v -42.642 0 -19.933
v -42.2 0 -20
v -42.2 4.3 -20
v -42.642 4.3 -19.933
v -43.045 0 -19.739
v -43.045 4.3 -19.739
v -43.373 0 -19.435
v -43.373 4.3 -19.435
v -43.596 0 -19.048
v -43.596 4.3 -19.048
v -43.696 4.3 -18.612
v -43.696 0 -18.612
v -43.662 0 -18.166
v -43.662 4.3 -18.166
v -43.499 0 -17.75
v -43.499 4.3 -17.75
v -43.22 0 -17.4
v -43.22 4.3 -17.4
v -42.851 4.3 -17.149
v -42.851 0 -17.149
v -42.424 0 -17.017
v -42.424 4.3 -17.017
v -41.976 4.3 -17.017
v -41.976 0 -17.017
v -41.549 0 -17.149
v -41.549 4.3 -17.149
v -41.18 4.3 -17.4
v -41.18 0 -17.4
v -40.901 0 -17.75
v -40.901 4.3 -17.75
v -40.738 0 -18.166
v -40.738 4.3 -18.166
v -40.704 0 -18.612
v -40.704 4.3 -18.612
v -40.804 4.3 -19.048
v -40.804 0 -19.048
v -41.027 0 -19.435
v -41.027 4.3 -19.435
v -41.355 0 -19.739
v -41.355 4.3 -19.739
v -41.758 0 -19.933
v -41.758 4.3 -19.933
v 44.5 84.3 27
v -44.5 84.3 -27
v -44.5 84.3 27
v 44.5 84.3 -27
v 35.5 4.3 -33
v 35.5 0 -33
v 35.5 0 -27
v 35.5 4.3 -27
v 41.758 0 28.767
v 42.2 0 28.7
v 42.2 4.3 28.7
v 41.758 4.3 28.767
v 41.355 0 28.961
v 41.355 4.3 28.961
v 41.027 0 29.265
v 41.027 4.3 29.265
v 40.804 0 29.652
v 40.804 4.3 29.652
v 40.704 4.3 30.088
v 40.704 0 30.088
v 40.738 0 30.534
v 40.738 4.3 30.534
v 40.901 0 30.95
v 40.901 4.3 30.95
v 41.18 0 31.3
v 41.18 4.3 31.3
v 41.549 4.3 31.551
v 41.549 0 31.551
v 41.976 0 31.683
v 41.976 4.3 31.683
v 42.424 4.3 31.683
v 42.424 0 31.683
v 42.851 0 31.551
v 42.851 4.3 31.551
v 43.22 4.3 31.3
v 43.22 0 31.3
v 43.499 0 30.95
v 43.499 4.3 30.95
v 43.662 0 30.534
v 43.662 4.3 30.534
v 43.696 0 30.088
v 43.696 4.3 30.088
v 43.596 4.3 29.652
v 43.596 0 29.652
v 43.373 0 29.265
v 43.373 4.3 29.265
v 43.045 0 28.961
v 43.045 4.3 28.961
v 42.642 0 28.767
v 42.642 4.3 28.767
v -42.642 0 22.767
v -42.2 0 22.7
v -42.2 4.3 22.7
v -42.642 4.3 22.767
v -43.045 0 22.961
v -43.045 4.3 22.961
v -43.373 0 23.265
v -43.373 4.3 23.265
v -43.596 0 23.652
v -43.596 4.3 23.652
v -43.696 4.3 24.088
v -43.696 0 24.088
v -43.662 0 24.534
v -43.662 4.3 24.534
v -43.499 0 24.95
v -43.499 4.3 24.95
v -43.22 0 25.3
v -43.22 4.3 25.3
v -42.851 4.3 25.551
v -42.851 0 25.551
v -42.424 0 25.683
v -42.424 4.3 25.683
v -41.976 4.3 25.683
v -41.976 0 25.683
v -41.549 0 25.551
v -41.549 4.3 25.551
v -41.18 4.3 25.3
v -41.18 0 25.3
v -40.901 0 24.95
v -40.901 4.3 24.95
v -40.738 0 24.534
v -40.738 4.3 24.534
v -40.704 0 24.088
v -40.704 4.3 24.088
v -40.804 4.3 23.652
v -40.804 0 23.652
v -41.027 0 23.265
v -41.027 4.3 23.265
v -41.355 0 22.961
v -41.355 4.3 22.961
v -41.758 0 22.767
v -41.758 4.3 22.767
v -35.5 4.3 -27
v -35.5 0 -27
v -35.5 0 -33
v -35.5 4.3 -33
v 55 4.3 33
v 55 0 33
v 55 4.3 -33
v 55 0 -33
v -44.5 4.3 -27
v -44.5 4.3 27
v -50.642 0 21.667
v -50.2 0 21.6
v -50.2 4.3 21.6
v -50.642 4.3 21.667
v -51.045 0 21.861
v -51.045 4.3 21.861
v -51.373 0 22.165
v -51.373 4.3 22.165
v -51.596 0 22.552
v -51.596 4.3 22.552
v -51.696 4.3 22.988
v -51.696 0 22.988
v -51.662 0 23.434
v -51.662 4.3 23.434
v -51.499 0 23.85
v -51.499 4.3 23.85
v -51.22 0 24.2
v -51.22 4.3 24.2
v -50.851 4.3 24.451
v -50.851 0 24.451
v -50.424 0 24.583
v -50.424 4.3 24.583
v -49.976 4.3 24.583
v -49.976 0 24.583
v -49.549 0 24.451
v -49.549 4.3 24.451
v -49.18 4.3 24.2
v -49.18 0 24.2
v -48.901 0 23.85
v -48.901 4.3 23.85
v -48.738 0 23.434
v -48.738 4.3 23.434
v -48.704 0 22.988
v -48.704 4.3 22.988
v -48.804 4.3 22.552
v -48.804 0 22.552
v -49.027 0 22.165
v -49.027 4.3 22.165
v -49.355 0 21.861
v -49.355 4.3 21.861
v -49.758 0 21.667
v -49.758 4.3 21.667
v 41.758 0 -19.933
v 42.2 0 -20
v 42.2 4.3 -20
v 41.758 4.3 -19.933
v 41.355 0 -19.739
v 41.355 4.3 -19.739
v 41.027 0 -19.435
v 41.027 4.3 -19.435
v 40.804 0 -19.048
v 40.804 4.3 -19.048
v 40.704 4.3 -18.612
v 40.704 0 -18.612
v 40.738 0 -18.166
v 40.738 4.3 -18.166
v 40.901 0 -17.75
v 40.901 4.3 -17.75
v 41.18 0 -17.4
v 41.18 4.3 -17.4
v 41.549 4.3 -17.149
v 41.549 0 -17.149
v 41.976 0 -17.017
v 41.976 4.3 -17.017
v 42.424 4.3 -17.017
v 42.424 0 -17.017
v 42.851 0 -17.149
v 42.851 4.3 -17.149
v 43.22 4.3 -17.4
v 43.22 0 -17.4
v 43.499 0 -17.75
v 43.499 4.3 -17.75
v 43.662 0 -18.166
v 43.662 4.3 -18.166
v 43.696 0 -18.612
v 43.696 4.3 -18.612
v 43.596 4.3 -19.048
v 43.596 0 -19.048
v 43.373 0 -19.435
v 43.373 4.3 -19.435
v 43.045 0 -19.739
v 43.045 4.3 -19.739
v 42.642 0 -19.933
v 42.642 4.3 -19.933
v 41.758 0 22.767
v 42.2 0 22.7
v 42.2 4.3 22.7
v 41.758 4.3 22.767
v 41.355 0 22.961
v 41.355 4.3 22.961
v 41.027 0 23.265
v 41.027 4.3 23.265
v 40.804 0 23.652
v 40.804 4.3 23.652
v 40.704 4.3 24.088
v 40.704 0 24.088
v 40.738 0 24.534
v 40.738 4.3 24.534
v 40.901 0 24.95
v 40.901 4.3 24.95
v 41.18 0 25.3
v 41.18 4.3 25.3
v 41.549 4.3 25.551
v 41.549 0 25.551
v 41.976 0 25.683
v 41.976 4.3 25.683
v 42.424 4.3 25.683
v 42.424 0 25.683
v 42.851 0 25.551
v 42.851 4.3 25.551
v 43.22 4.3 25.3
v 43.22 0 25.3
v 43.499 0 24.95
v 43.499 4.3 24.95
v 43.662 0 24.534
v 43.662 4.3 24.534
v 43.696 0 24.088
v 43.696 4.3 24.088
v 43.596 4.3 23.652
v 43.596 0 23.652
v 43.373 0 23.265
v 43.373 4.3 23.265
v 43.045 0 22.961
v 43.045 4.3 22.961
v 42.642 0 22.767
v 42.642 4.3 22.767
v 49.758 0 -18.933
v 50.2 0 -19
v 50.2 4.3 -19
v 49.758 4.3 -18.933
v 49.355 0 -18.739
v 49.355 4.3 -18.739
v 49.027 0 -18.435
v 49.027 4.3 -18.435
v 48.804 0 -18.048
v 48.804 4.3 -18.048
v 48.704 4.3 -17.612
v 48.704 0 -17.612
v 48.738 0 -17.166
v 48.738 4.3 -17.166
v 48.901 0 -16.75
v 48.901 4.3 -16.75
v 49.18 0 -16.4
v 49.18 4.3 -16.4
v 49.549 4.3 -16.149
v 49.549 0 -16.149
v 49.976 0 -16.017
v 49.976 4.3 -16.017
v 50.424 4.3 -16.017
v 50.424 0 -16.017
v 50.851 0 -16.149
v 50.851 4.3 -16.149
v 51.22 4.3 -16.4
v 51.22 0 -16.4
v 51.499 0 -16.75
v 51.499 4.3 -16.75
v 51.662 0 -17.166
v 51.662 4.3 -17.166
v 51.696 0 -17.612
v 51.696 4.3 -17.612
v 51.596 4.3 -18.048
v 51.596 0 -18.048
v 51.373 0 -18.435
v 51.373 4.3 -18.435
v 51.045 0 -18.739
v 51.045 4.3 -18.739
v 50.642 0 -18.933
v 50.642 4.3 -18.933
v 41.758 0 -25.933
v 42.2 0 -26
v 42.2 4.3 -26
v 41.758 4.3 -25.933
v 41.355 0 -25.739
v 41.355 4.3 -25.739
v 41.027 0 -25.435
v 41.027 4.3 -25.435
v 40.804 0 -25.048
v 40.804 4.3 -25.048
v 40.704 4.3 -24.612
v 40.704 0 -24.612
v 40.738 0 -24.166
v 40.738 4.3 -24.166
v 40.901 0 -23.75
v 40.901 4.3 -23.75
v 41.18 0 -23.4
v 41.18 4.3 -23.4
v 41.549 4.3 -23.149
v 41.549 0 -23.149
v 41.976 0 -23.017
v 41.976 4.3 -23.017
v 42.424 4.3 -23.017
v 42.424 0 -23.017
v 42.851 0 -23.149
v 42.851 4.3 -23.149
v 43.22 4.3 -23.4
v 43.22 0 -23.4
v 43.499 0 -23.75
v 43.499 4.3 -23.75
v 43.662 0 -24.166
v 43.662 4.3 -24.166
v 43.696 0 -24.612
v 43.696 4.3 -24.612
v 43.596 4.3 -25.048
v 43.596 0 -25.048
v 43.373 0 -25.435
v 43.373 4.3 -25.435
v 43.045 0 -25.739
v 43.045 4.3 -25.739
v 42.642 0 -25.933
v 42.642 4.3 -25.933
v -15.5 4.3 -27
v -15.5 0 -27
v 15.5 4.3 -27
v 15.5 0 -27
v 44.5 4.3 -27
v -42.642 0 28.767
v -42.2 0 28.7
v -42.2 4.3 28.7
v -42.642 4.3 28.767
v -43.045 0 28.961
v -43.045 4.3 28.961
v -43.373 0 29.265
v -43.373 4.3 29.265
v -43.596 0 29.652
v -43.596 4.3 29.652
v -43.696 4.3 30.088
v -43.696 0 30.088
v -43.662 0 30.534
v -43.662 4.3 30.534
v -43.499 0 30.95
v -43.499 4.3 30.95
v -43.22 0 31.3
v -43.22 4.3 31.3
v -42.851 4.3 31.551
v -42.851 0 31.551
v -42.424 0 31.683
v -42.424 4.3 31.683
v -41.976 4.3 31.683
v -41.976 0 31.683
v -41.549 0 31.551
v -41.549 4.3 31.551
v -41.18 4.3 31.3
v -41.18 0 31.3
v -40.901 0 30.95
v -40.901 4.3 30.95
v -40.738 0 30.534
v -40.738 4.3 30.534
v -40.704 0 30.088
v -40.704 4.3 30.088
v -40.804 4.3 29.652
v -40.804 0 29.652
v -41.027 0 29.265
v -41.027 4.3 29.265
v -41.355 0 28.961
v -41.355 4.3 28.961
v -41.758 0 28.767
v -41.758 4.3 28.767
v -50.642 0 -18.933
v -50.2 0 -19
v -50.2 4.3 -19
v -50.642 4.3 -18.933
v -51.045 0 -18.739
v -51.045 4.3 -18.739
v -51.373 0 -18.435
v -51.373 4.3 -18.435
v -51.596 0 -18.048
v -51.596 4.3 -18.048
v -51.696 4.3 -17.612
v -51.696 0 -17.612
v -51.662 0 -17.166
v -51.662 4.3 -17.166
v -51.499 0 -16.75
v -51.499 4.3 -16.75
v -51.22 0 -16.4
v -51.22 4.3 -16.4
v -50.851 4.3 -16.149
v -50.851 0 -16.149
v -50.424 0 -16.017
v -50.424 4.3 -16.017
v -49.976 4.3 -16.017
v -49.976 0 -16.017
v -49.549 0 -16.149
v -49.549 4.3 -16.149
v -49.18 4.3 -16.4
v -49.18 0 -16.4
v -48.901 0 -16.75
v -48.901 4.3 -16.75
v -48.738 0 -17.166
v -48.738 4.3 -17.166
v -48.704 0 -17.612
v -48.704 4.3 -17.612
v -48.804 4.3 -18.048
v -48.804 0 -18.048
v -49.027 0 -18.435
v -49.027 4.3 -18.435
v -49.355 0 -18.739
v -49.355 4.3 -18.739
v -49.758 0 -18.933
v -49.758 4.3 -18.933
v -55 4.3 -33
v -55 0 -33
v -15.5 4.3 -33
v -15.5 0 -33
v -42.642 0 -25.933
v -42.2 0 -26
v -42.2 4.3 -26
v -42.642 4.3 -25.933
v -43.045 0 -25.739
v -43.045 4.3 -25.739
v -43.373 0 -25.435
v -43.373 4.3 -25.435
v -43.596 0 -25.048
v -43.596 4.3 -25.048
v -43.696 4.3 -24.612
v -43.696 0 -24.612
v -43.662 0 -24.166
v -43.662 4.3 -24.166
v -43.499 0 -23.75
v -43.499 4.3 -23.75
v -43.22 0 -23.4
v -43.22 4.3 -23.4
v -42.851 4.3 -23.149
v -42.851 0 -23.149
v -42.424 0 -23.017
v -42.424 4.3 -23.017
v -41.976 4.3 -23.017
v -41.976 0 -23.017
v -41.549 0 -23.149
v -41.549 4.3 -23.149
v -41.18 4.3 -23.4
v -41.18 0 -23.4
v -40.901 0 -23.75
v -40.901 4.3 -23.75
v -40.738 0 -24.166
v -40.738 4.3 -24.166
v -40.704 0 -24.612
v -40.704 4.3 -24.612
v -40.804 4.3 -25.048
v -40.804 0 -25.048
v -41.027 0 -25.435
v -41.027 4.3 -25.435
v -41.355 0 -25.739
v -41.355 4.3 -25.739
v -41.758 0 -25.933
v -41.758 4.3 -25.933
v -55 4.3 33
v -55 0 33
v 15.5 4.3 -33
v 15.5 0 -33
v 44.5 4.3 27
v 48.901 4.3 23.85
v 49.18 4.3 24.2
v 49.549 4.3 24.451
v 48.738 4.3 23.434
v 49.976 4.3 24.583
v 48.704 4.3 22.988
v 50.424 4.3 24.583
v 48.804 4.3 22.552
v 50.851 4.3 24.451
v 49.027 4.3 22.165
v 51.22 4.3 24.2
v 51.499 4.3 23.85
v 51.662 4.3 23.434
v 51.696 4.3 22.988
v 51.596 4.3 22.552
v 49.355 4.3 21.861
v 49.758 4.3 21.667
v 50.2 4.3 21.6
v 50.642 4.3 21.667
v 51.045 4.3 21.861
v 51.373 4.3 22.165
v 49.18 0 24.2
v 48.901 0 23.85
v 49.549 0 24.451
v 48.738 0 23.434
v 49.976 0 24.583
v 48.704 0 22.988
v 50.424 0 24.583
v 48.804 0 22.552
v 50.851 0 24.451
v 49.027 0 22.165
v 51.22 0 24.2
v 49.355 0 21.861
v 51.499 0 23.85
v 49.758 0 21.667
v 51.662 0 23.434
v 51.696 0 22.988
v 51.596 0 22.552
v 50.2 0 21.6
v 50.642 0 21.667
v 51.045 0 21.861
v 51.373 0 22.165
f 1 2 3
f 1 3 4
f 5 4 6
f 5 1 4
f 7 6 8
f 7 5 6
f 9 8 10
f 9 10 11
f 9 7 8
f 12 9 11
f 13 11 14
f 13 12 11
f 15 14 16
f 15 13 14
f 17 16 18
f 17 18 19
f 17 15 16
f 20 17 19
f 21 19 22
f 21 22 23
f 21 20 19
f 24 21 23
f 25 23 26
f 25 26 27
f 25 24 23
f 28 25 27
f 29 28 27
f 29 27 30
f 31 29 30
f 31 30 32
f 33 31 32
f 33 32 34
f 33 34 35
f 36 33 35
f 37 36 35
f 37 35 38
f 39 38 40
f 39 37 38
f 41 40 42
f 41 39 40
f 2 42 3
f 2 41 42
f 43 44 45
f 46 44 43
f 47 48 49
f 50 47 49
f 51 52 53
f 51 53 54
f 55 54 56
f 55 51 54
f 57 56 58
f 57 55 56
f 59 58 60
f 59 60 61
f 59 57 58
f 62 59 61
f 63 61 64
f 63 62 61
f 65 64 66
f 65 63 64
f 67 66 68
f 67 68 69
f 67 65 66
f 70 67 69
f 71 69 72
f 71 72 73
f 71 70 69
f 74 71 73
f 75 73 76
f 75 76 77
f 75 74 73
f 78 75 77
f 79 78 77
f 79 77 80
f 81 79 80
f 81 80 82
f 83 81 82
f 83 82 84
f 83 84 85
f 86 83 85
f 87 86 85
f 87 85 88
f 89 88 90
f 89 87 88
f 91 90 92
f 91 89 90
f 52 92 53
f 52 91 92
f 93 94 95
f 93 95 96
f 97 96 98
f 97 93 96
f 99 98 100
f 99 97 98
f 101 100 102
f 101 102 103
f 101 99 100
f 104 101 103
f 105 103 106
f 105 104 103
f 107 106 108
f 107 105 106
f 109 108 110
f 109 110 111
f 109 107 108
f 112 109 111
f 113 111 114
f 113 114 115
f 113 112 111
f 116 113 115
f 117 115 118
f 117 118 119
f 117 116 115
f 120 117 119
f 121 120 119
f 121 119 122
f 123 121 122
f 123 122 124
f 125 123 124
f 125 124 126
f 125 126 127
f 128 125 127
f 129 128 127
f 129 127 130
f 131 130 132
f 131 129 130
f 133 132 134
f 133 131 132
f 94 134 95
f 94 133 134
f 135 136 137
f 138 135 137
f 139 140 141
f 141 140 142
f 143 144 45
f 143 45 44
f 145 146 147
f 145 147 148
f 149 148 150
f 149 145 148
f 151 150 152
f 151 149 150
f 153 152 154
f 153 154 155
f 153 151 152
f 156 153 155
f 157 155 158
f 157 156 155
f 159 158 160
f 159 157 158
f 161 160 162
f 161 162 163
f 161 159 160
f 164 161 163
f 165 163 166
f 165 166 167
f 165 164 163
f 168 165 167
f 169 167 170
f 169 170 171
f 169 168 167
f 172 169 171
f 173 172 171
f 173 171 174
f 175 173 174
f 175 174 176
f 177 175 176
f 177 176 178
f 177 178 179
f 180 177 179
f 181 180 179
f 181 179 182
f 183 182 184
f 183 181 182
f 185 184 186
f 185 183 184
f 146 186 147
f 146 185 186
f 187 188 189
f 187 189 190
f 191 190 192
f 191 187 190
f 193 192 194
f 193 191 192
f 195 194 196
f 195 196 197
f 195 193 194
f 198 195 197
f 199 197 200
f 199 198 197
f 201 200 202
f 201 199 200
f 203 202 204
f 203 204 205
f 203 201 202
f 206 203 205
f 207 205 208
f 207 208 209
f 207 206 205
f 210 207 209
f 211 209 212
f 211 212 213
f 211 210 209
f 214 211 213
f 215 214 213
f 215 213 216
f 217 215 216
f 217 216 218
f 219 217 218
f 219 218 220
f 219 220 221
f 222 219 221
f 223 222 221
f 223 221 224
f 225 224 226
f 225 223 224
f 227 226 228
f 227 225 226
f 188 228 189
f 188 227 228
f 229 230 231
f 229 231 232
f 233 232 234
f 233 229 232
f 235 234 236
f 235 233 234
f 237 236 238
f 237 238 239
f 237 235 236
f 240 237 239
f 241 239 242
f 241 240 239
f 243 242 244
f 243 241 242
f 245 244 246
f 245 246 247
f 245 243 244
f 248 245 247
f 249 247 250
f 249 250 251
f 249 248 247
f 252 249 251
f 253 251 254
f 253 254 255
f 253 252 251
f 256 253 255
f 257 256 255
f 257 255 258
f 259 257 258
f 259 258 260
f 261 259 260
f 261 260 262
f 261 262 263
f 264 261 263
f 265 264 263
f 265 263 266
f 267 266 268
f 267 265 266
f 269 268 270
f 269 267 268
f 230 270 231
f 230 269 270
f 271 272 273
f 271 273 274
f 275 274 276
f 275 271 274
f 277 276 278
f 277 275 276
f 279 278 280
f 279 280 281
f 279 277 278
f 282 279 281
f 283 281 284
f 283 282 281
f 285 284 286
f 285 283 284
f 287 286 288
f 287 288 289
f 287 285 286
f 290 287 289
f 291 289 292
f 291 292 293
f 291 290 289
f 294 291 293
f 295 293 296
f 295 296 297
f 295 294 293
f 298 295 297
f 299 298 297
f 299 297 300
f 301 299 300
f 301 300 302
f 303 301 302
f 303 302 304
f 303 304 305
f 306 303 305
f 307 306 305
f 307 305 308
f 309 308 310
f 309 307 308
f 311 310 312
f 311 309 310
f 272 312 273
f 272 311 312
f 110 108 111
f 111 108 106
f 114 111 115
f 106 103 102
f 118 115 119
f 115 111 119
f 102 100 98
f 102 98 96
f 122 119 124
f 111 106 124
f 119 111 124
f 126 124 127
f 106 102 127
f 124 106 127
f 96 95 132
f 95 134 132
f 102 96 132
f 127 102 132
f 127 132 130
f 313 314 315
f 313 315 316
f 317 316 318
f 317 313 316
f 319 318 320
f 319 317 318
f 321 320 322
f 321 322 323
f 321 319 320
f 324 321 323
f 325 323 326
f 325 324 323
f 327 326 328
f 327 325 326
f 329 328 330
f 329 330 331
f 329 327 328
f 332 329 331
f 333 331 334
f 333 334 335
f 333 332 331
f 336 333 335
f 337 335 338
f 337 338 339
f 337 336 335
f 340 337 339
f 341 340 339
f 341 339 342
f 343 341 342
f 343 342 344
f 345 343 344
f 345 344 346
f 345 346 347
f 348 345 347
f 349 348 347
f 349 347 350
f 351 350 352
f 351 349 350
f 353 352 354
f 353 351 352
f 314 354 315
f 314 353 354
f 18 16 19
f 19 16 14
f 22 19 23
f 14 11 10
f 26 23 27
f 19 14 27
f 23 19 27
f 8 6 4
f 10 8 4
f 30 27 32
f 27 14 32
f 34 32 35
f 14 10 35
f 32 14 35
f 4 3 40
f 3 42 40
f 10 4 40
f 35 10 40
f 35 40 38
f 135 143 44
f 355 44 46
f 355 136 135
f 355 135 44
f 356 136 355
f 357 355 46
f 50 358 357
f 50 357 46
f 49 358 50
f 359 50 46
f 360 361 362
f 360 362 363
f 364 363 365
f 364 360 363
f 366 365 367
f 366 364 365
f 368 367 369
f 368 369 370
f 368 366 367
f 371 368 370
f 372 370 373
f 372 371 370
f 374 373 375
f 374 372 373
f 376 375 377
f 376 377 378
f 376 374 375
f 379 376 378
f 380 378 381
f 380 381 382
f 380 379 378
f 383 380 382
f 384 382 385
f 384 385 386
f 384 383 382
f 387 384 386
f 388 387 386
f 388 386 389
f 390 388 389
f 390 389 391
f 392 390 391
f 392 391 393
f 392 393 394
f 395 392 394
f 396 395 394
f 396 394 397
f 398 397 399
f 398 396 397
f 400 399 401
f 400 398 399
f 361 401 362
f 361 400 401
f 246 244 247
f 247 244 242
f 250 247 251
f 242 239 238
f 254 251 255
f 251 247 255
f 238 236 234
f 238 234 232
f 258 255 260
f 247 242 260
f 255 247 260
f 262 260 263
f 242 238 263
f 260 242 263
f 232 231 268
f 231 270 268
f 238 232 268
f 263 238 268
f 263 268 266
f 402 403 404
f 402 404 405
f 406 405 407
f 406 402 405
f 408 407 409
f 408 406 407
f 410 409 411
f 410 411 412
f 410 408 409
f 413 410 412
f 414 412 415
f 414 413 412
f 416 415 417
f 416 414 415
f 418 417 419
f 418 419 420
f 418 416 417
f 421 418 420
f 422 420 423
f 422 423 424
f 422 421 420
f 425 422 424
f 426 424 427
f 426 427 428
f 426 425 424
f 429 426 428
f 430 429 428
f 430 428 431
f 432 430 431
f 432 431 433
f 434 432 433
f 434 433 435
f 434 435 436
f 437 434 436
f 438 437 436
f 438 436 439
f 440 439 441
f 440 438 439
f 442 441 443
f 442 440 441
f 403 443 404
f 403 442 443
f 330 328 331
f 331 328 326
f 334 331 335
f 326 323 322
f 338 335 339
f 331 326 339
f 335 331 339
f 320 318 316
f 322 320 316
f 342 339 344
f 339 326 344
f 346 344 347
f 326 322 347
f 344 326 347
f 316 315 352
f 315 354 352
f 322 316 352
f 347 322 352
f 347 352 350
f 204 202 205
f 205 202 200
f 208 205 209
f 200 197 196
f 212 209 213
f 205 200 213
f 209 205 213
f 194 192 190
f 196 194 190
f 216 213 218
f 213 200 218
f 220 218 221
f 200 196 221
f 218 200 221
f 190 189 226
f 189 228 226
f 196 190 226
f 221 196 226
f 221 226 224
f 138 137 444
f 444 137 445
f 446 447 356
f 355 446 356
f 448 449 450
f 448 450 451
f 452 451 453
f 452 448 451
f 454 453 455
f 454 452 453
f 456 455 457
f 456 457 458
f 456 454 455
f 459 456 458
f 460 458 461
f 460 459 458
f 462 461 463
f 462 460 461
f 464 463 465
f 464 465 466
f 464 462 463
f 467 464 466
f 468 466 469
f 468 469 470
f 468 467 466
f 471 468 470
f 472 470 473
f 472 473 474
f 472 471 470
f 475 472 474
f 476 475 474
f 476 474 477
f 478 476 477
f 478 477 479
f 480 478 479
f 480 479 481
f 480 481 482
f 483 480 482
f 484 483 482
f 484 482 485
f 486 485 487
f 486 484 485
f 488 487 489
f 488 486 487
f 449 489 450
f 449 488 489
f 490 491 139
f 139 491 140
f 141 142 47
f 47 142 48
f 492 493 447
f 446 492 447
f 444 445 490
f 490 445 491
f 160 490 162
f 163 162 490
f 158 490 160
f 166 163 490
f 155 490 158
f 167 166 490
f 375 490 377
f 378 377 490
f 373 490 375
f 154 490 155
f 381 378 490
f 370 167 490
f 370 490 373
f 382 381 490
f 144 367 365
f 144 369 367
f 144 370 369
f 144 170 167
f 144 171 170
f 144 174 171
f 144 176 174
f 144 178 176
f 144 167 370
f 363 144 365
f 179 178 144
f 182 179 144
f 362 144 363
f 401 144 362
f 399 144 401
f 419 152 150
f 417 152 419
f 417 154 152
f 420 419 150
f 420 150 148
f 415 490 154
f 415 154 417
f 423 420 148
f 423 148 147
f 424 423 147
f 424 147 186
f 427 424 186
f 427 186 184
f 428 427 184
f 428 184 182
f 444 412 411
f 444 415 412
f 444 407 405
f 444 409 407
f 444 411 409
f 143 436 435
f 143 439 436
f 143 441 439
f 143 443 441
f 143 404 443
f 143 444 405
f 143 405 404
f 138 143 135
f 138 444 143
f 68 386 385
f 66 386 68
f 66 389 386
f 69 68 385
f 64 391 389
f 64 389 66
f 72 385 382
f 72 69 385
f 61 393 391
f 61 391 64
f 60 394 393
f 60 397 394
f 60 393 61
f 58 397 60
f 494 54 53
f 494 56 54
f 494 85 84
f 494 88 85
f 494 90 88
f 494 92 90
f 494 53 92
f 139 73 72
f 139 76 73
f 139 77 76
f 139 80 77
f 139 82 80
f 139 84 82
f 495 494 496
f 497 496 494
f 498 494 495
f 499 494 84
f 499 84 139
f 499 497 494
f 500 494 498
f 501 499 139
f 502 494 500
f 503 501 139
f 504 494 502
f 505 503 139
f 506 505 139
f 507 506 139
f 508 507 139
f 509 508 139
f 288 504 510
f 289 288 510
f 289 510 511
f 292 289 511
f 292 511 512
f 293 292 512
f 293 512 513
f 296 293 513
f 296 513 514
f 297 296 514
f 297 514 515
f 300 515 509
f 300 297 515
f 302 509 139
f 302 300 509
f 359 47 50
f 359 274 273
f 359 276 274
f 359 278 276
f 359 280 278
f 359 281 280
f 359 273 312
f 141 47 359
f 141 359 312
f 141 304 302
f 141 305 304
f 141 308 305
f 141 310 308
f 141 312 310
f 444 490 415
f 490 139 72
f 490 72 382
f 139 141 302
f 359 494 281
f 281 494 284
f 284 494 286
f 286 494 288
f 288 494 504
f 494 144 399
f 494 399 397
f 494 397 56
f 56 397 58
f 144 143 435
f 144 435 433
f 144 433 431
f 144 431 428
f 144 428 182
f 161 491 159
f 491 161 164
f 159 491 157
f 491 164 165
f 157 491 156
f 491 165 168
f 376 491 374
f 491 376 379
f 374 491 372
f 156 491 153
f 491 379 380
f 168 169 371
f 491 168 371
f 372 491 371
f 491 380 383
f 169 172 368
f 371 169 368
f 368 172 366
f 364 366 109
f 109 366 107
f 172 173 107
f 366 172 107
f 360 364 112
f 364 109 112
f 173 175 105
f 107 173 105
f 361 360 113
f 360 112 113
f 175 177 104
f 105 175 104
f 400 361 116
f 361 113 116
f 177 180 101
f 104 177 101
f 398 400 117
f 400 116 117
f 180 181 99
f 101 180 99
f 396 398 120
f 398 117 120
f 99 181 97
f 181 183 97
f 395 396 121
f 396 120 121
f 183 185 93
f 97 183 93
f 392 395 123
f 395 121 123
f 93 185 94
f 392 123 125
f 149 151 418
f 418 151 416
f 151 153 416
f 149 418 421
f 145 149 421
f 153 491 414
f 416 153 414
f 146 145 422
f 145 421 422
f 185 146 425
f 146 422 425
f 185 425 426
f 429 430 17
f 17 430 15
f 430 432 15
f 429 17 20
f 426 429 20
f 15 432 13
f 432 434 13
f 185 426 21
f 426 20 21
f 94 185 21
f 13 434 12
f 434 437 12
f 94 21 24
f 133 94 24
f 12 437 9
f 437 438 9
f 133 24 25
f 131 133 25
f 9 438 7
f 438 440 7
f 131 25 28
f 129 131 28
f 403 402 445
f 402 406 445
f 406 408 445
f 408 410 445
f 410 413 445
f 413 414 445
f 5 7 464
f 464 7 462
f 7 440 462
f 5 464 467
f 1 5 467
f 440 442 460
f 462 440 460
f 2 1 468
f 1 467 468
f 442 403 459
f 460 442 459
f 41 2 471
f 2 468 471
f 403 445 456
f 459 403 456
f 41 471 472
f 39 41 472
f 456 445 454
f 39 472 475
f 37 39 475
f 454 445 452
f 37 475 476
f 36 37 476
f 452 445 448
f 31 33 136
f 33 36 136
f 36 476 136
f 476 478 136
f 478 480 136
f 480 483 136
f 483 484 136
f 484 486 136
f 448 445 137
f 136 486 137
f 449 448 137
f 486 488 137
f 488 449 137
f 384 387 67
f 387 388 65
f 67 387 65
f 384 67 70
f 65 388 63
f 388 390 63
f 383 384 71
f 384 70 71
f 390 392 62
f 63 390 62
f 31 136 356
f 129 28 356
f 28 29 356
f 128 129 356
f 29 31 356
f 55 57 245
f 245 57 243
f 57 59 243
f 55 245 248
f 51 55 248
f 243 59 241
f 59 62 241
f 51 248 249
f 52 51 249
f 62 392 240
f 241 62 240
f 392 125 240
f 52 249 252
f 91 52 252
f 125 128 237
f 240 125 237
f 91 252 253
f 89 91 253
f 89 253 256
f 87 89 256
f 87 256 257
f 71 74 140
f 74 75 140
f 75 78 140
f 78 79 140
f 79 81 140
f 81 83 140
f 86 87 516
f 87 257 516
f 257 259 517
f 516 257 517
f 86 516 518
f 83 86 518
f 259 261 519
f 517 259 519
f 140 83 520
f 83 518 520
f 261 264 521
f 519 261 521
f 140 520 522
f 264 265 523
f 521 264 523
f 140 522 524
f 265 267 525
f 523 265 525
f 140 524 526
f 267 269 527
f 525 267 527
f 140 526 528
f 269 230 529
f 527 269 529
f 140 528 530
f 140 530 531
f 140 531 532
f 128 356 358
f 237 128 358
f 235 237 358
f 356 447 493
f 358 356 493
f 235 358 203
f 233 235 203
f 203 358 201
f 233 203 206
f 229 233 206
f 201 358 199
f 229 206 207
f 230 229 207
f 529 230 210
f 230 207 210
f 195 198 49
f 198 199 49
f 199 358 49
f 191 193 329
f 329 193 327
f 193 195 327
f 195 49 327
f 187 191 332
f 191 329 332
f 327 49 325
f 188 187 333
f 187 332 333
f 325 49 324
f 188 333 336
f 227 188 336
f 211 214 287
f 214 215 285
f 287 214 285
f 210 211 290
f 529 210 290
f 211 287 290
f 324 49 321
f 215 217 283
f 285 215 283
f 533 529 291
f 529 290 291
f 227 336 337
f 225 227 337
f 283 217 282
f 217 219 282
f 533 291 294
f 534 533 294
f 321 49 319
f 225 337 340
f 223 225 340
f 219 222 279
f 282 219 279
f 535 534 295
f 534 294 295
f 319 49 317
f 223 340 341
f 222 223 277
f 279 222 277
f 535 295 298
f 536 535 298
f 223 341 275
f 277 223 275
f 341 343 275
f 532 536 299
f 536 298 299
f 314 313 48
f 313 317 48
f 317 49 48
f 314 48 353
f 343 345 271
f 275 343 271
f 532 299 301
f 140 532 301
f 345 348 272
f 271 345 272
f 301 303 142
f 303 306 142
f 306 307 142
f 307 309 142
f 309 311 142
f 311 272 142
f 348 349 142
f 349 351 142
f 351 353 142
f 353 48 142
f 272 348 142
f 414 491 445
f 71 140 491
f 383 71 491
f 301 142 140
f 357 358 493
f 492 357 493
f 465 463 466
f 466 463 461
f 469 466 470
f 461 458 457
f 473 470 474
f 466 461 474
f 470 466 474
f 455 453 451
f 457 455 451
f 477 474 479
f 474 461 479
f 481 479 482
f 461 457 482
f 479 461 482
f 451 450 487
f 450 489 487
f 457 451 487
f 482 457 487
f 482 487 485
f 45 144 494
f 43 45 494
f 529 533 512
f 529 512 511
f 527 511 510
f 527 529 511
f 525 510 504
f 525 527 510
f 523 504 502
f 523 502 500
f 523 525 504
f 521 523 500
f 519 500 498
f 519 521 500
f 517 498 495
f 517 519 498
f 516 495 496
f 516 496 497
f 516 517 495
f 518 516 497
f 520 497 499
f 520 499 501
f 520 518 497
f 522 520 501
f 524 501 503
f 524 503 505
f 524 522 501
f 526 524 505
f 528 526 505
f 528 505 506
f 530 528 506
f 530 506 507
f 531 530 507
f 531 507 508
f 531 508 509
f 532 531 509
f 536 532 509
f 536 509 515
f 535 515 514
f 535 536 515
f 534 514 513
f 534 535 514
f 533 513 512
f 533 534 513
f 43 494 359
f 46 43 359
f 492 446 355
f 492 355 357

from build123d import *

# Parameters (mm, degrees)
SKETCH1_R           = 1.5
BOSS_EXTRUDE1_DEPTH = 4.3
SKETCH2_W           = 89
SKETCH2_H           = 54
BOSS_EXTRUDE2_DEPTH = 80


with BuildPart() as part:
    # Sketch1 → Boss-Extrude1 (new body)
    with BuildSketch(Plane(origin=(0, 0, 0), x_dir=(1, 0, 0), z_dir=(0, 1, 0))):
        Polygon((-35.5, 27), (-35.5, 33), (-55, 33), (-55, -33), (55, -33), (55, 33), (35.5, 33), (35.5, 27), (15.5, 27), (15.5, 33), (-15.5, 33), (-15.5, 27), align=None)
        with Locations(Location((-42.2, -30.2, 0), (0, 0, 90))):
            Circle(SKETCH1_R, mode=Mode.SUBTRACT)
        with Locations(Location((-50.2, -23.1, 0), (0, 0, 90))):
            Circle(SKETCH1_R, mode=Mode.SUBTRACT)
        with Locations(Location((-42.2, -24.2, 0), (0, 0, 90))):
            Circle(SKETCH1_R, mode=Mode.SUBTRACT)
        with Locations(Location((42.2, -30.2, 0), (0, 0, 90))):
            Circle(SKETCH1_R, mode=Mode.SUBTRACT)
        with Locations(Location((42.2, -24.2, 0), (0, 0, 90))):
            Circle(SKETCH1_R, mode=Mode.SUBTRACT)
        with Locations(Location((50.2, -23.1, 0), (0, 0, 90))):
            Circle(SKETCH1_R, mode=Mode.SUBTRACT)
        with Locations(Location((-50.2, 17.5, 0), (0, 0, 90))):
            Circle(SKETCH1_R, mode=Mode.SUBTRACT)
        with Locations(Location((-42.2, 18.5, 0), (0, 0, 90))):
            Circle(SKETCH1_R, mode=Mode.SUBTRACT)
        with Locations(Location((-42.2, 24.5, 0), (0, 0, 90))):
            Circle(SKETCH1_R, mode=Mode.SUBTRACT)
        with Locations(Location((42.2, 18.5, 0), (0, 0, 90))):
            Circle(SKETCH1_R, mode=Mode.SUBTRACT)
        with Locations(Location((50.2, 17.5, 0), (0, 0, 90))):
            Circle(SKETCH1_R, mode=Mode.SUBTRACT)
        with Locations(Location((42.2, 24.5, 0), (0, 0, 90))):
            Circle(SKETCH1_R, mode=Mode.SUBTRACT)
    extrude(amount=BOSS_EXTRUDE1_DEPTH)

    # Sketch2 → Boss-Extrude2 (add)
    with BuildSketch(Plane(origin=(0, 4.3, 0), x_dir=(1, 0, 0), z_dir=(0, 1, 0))):
        Rectangle(SKETCH2_W, SKETCH2_H)
    extrude(amount=BOSS_EXTRUDE2_DEPTH)


solid = part.part
